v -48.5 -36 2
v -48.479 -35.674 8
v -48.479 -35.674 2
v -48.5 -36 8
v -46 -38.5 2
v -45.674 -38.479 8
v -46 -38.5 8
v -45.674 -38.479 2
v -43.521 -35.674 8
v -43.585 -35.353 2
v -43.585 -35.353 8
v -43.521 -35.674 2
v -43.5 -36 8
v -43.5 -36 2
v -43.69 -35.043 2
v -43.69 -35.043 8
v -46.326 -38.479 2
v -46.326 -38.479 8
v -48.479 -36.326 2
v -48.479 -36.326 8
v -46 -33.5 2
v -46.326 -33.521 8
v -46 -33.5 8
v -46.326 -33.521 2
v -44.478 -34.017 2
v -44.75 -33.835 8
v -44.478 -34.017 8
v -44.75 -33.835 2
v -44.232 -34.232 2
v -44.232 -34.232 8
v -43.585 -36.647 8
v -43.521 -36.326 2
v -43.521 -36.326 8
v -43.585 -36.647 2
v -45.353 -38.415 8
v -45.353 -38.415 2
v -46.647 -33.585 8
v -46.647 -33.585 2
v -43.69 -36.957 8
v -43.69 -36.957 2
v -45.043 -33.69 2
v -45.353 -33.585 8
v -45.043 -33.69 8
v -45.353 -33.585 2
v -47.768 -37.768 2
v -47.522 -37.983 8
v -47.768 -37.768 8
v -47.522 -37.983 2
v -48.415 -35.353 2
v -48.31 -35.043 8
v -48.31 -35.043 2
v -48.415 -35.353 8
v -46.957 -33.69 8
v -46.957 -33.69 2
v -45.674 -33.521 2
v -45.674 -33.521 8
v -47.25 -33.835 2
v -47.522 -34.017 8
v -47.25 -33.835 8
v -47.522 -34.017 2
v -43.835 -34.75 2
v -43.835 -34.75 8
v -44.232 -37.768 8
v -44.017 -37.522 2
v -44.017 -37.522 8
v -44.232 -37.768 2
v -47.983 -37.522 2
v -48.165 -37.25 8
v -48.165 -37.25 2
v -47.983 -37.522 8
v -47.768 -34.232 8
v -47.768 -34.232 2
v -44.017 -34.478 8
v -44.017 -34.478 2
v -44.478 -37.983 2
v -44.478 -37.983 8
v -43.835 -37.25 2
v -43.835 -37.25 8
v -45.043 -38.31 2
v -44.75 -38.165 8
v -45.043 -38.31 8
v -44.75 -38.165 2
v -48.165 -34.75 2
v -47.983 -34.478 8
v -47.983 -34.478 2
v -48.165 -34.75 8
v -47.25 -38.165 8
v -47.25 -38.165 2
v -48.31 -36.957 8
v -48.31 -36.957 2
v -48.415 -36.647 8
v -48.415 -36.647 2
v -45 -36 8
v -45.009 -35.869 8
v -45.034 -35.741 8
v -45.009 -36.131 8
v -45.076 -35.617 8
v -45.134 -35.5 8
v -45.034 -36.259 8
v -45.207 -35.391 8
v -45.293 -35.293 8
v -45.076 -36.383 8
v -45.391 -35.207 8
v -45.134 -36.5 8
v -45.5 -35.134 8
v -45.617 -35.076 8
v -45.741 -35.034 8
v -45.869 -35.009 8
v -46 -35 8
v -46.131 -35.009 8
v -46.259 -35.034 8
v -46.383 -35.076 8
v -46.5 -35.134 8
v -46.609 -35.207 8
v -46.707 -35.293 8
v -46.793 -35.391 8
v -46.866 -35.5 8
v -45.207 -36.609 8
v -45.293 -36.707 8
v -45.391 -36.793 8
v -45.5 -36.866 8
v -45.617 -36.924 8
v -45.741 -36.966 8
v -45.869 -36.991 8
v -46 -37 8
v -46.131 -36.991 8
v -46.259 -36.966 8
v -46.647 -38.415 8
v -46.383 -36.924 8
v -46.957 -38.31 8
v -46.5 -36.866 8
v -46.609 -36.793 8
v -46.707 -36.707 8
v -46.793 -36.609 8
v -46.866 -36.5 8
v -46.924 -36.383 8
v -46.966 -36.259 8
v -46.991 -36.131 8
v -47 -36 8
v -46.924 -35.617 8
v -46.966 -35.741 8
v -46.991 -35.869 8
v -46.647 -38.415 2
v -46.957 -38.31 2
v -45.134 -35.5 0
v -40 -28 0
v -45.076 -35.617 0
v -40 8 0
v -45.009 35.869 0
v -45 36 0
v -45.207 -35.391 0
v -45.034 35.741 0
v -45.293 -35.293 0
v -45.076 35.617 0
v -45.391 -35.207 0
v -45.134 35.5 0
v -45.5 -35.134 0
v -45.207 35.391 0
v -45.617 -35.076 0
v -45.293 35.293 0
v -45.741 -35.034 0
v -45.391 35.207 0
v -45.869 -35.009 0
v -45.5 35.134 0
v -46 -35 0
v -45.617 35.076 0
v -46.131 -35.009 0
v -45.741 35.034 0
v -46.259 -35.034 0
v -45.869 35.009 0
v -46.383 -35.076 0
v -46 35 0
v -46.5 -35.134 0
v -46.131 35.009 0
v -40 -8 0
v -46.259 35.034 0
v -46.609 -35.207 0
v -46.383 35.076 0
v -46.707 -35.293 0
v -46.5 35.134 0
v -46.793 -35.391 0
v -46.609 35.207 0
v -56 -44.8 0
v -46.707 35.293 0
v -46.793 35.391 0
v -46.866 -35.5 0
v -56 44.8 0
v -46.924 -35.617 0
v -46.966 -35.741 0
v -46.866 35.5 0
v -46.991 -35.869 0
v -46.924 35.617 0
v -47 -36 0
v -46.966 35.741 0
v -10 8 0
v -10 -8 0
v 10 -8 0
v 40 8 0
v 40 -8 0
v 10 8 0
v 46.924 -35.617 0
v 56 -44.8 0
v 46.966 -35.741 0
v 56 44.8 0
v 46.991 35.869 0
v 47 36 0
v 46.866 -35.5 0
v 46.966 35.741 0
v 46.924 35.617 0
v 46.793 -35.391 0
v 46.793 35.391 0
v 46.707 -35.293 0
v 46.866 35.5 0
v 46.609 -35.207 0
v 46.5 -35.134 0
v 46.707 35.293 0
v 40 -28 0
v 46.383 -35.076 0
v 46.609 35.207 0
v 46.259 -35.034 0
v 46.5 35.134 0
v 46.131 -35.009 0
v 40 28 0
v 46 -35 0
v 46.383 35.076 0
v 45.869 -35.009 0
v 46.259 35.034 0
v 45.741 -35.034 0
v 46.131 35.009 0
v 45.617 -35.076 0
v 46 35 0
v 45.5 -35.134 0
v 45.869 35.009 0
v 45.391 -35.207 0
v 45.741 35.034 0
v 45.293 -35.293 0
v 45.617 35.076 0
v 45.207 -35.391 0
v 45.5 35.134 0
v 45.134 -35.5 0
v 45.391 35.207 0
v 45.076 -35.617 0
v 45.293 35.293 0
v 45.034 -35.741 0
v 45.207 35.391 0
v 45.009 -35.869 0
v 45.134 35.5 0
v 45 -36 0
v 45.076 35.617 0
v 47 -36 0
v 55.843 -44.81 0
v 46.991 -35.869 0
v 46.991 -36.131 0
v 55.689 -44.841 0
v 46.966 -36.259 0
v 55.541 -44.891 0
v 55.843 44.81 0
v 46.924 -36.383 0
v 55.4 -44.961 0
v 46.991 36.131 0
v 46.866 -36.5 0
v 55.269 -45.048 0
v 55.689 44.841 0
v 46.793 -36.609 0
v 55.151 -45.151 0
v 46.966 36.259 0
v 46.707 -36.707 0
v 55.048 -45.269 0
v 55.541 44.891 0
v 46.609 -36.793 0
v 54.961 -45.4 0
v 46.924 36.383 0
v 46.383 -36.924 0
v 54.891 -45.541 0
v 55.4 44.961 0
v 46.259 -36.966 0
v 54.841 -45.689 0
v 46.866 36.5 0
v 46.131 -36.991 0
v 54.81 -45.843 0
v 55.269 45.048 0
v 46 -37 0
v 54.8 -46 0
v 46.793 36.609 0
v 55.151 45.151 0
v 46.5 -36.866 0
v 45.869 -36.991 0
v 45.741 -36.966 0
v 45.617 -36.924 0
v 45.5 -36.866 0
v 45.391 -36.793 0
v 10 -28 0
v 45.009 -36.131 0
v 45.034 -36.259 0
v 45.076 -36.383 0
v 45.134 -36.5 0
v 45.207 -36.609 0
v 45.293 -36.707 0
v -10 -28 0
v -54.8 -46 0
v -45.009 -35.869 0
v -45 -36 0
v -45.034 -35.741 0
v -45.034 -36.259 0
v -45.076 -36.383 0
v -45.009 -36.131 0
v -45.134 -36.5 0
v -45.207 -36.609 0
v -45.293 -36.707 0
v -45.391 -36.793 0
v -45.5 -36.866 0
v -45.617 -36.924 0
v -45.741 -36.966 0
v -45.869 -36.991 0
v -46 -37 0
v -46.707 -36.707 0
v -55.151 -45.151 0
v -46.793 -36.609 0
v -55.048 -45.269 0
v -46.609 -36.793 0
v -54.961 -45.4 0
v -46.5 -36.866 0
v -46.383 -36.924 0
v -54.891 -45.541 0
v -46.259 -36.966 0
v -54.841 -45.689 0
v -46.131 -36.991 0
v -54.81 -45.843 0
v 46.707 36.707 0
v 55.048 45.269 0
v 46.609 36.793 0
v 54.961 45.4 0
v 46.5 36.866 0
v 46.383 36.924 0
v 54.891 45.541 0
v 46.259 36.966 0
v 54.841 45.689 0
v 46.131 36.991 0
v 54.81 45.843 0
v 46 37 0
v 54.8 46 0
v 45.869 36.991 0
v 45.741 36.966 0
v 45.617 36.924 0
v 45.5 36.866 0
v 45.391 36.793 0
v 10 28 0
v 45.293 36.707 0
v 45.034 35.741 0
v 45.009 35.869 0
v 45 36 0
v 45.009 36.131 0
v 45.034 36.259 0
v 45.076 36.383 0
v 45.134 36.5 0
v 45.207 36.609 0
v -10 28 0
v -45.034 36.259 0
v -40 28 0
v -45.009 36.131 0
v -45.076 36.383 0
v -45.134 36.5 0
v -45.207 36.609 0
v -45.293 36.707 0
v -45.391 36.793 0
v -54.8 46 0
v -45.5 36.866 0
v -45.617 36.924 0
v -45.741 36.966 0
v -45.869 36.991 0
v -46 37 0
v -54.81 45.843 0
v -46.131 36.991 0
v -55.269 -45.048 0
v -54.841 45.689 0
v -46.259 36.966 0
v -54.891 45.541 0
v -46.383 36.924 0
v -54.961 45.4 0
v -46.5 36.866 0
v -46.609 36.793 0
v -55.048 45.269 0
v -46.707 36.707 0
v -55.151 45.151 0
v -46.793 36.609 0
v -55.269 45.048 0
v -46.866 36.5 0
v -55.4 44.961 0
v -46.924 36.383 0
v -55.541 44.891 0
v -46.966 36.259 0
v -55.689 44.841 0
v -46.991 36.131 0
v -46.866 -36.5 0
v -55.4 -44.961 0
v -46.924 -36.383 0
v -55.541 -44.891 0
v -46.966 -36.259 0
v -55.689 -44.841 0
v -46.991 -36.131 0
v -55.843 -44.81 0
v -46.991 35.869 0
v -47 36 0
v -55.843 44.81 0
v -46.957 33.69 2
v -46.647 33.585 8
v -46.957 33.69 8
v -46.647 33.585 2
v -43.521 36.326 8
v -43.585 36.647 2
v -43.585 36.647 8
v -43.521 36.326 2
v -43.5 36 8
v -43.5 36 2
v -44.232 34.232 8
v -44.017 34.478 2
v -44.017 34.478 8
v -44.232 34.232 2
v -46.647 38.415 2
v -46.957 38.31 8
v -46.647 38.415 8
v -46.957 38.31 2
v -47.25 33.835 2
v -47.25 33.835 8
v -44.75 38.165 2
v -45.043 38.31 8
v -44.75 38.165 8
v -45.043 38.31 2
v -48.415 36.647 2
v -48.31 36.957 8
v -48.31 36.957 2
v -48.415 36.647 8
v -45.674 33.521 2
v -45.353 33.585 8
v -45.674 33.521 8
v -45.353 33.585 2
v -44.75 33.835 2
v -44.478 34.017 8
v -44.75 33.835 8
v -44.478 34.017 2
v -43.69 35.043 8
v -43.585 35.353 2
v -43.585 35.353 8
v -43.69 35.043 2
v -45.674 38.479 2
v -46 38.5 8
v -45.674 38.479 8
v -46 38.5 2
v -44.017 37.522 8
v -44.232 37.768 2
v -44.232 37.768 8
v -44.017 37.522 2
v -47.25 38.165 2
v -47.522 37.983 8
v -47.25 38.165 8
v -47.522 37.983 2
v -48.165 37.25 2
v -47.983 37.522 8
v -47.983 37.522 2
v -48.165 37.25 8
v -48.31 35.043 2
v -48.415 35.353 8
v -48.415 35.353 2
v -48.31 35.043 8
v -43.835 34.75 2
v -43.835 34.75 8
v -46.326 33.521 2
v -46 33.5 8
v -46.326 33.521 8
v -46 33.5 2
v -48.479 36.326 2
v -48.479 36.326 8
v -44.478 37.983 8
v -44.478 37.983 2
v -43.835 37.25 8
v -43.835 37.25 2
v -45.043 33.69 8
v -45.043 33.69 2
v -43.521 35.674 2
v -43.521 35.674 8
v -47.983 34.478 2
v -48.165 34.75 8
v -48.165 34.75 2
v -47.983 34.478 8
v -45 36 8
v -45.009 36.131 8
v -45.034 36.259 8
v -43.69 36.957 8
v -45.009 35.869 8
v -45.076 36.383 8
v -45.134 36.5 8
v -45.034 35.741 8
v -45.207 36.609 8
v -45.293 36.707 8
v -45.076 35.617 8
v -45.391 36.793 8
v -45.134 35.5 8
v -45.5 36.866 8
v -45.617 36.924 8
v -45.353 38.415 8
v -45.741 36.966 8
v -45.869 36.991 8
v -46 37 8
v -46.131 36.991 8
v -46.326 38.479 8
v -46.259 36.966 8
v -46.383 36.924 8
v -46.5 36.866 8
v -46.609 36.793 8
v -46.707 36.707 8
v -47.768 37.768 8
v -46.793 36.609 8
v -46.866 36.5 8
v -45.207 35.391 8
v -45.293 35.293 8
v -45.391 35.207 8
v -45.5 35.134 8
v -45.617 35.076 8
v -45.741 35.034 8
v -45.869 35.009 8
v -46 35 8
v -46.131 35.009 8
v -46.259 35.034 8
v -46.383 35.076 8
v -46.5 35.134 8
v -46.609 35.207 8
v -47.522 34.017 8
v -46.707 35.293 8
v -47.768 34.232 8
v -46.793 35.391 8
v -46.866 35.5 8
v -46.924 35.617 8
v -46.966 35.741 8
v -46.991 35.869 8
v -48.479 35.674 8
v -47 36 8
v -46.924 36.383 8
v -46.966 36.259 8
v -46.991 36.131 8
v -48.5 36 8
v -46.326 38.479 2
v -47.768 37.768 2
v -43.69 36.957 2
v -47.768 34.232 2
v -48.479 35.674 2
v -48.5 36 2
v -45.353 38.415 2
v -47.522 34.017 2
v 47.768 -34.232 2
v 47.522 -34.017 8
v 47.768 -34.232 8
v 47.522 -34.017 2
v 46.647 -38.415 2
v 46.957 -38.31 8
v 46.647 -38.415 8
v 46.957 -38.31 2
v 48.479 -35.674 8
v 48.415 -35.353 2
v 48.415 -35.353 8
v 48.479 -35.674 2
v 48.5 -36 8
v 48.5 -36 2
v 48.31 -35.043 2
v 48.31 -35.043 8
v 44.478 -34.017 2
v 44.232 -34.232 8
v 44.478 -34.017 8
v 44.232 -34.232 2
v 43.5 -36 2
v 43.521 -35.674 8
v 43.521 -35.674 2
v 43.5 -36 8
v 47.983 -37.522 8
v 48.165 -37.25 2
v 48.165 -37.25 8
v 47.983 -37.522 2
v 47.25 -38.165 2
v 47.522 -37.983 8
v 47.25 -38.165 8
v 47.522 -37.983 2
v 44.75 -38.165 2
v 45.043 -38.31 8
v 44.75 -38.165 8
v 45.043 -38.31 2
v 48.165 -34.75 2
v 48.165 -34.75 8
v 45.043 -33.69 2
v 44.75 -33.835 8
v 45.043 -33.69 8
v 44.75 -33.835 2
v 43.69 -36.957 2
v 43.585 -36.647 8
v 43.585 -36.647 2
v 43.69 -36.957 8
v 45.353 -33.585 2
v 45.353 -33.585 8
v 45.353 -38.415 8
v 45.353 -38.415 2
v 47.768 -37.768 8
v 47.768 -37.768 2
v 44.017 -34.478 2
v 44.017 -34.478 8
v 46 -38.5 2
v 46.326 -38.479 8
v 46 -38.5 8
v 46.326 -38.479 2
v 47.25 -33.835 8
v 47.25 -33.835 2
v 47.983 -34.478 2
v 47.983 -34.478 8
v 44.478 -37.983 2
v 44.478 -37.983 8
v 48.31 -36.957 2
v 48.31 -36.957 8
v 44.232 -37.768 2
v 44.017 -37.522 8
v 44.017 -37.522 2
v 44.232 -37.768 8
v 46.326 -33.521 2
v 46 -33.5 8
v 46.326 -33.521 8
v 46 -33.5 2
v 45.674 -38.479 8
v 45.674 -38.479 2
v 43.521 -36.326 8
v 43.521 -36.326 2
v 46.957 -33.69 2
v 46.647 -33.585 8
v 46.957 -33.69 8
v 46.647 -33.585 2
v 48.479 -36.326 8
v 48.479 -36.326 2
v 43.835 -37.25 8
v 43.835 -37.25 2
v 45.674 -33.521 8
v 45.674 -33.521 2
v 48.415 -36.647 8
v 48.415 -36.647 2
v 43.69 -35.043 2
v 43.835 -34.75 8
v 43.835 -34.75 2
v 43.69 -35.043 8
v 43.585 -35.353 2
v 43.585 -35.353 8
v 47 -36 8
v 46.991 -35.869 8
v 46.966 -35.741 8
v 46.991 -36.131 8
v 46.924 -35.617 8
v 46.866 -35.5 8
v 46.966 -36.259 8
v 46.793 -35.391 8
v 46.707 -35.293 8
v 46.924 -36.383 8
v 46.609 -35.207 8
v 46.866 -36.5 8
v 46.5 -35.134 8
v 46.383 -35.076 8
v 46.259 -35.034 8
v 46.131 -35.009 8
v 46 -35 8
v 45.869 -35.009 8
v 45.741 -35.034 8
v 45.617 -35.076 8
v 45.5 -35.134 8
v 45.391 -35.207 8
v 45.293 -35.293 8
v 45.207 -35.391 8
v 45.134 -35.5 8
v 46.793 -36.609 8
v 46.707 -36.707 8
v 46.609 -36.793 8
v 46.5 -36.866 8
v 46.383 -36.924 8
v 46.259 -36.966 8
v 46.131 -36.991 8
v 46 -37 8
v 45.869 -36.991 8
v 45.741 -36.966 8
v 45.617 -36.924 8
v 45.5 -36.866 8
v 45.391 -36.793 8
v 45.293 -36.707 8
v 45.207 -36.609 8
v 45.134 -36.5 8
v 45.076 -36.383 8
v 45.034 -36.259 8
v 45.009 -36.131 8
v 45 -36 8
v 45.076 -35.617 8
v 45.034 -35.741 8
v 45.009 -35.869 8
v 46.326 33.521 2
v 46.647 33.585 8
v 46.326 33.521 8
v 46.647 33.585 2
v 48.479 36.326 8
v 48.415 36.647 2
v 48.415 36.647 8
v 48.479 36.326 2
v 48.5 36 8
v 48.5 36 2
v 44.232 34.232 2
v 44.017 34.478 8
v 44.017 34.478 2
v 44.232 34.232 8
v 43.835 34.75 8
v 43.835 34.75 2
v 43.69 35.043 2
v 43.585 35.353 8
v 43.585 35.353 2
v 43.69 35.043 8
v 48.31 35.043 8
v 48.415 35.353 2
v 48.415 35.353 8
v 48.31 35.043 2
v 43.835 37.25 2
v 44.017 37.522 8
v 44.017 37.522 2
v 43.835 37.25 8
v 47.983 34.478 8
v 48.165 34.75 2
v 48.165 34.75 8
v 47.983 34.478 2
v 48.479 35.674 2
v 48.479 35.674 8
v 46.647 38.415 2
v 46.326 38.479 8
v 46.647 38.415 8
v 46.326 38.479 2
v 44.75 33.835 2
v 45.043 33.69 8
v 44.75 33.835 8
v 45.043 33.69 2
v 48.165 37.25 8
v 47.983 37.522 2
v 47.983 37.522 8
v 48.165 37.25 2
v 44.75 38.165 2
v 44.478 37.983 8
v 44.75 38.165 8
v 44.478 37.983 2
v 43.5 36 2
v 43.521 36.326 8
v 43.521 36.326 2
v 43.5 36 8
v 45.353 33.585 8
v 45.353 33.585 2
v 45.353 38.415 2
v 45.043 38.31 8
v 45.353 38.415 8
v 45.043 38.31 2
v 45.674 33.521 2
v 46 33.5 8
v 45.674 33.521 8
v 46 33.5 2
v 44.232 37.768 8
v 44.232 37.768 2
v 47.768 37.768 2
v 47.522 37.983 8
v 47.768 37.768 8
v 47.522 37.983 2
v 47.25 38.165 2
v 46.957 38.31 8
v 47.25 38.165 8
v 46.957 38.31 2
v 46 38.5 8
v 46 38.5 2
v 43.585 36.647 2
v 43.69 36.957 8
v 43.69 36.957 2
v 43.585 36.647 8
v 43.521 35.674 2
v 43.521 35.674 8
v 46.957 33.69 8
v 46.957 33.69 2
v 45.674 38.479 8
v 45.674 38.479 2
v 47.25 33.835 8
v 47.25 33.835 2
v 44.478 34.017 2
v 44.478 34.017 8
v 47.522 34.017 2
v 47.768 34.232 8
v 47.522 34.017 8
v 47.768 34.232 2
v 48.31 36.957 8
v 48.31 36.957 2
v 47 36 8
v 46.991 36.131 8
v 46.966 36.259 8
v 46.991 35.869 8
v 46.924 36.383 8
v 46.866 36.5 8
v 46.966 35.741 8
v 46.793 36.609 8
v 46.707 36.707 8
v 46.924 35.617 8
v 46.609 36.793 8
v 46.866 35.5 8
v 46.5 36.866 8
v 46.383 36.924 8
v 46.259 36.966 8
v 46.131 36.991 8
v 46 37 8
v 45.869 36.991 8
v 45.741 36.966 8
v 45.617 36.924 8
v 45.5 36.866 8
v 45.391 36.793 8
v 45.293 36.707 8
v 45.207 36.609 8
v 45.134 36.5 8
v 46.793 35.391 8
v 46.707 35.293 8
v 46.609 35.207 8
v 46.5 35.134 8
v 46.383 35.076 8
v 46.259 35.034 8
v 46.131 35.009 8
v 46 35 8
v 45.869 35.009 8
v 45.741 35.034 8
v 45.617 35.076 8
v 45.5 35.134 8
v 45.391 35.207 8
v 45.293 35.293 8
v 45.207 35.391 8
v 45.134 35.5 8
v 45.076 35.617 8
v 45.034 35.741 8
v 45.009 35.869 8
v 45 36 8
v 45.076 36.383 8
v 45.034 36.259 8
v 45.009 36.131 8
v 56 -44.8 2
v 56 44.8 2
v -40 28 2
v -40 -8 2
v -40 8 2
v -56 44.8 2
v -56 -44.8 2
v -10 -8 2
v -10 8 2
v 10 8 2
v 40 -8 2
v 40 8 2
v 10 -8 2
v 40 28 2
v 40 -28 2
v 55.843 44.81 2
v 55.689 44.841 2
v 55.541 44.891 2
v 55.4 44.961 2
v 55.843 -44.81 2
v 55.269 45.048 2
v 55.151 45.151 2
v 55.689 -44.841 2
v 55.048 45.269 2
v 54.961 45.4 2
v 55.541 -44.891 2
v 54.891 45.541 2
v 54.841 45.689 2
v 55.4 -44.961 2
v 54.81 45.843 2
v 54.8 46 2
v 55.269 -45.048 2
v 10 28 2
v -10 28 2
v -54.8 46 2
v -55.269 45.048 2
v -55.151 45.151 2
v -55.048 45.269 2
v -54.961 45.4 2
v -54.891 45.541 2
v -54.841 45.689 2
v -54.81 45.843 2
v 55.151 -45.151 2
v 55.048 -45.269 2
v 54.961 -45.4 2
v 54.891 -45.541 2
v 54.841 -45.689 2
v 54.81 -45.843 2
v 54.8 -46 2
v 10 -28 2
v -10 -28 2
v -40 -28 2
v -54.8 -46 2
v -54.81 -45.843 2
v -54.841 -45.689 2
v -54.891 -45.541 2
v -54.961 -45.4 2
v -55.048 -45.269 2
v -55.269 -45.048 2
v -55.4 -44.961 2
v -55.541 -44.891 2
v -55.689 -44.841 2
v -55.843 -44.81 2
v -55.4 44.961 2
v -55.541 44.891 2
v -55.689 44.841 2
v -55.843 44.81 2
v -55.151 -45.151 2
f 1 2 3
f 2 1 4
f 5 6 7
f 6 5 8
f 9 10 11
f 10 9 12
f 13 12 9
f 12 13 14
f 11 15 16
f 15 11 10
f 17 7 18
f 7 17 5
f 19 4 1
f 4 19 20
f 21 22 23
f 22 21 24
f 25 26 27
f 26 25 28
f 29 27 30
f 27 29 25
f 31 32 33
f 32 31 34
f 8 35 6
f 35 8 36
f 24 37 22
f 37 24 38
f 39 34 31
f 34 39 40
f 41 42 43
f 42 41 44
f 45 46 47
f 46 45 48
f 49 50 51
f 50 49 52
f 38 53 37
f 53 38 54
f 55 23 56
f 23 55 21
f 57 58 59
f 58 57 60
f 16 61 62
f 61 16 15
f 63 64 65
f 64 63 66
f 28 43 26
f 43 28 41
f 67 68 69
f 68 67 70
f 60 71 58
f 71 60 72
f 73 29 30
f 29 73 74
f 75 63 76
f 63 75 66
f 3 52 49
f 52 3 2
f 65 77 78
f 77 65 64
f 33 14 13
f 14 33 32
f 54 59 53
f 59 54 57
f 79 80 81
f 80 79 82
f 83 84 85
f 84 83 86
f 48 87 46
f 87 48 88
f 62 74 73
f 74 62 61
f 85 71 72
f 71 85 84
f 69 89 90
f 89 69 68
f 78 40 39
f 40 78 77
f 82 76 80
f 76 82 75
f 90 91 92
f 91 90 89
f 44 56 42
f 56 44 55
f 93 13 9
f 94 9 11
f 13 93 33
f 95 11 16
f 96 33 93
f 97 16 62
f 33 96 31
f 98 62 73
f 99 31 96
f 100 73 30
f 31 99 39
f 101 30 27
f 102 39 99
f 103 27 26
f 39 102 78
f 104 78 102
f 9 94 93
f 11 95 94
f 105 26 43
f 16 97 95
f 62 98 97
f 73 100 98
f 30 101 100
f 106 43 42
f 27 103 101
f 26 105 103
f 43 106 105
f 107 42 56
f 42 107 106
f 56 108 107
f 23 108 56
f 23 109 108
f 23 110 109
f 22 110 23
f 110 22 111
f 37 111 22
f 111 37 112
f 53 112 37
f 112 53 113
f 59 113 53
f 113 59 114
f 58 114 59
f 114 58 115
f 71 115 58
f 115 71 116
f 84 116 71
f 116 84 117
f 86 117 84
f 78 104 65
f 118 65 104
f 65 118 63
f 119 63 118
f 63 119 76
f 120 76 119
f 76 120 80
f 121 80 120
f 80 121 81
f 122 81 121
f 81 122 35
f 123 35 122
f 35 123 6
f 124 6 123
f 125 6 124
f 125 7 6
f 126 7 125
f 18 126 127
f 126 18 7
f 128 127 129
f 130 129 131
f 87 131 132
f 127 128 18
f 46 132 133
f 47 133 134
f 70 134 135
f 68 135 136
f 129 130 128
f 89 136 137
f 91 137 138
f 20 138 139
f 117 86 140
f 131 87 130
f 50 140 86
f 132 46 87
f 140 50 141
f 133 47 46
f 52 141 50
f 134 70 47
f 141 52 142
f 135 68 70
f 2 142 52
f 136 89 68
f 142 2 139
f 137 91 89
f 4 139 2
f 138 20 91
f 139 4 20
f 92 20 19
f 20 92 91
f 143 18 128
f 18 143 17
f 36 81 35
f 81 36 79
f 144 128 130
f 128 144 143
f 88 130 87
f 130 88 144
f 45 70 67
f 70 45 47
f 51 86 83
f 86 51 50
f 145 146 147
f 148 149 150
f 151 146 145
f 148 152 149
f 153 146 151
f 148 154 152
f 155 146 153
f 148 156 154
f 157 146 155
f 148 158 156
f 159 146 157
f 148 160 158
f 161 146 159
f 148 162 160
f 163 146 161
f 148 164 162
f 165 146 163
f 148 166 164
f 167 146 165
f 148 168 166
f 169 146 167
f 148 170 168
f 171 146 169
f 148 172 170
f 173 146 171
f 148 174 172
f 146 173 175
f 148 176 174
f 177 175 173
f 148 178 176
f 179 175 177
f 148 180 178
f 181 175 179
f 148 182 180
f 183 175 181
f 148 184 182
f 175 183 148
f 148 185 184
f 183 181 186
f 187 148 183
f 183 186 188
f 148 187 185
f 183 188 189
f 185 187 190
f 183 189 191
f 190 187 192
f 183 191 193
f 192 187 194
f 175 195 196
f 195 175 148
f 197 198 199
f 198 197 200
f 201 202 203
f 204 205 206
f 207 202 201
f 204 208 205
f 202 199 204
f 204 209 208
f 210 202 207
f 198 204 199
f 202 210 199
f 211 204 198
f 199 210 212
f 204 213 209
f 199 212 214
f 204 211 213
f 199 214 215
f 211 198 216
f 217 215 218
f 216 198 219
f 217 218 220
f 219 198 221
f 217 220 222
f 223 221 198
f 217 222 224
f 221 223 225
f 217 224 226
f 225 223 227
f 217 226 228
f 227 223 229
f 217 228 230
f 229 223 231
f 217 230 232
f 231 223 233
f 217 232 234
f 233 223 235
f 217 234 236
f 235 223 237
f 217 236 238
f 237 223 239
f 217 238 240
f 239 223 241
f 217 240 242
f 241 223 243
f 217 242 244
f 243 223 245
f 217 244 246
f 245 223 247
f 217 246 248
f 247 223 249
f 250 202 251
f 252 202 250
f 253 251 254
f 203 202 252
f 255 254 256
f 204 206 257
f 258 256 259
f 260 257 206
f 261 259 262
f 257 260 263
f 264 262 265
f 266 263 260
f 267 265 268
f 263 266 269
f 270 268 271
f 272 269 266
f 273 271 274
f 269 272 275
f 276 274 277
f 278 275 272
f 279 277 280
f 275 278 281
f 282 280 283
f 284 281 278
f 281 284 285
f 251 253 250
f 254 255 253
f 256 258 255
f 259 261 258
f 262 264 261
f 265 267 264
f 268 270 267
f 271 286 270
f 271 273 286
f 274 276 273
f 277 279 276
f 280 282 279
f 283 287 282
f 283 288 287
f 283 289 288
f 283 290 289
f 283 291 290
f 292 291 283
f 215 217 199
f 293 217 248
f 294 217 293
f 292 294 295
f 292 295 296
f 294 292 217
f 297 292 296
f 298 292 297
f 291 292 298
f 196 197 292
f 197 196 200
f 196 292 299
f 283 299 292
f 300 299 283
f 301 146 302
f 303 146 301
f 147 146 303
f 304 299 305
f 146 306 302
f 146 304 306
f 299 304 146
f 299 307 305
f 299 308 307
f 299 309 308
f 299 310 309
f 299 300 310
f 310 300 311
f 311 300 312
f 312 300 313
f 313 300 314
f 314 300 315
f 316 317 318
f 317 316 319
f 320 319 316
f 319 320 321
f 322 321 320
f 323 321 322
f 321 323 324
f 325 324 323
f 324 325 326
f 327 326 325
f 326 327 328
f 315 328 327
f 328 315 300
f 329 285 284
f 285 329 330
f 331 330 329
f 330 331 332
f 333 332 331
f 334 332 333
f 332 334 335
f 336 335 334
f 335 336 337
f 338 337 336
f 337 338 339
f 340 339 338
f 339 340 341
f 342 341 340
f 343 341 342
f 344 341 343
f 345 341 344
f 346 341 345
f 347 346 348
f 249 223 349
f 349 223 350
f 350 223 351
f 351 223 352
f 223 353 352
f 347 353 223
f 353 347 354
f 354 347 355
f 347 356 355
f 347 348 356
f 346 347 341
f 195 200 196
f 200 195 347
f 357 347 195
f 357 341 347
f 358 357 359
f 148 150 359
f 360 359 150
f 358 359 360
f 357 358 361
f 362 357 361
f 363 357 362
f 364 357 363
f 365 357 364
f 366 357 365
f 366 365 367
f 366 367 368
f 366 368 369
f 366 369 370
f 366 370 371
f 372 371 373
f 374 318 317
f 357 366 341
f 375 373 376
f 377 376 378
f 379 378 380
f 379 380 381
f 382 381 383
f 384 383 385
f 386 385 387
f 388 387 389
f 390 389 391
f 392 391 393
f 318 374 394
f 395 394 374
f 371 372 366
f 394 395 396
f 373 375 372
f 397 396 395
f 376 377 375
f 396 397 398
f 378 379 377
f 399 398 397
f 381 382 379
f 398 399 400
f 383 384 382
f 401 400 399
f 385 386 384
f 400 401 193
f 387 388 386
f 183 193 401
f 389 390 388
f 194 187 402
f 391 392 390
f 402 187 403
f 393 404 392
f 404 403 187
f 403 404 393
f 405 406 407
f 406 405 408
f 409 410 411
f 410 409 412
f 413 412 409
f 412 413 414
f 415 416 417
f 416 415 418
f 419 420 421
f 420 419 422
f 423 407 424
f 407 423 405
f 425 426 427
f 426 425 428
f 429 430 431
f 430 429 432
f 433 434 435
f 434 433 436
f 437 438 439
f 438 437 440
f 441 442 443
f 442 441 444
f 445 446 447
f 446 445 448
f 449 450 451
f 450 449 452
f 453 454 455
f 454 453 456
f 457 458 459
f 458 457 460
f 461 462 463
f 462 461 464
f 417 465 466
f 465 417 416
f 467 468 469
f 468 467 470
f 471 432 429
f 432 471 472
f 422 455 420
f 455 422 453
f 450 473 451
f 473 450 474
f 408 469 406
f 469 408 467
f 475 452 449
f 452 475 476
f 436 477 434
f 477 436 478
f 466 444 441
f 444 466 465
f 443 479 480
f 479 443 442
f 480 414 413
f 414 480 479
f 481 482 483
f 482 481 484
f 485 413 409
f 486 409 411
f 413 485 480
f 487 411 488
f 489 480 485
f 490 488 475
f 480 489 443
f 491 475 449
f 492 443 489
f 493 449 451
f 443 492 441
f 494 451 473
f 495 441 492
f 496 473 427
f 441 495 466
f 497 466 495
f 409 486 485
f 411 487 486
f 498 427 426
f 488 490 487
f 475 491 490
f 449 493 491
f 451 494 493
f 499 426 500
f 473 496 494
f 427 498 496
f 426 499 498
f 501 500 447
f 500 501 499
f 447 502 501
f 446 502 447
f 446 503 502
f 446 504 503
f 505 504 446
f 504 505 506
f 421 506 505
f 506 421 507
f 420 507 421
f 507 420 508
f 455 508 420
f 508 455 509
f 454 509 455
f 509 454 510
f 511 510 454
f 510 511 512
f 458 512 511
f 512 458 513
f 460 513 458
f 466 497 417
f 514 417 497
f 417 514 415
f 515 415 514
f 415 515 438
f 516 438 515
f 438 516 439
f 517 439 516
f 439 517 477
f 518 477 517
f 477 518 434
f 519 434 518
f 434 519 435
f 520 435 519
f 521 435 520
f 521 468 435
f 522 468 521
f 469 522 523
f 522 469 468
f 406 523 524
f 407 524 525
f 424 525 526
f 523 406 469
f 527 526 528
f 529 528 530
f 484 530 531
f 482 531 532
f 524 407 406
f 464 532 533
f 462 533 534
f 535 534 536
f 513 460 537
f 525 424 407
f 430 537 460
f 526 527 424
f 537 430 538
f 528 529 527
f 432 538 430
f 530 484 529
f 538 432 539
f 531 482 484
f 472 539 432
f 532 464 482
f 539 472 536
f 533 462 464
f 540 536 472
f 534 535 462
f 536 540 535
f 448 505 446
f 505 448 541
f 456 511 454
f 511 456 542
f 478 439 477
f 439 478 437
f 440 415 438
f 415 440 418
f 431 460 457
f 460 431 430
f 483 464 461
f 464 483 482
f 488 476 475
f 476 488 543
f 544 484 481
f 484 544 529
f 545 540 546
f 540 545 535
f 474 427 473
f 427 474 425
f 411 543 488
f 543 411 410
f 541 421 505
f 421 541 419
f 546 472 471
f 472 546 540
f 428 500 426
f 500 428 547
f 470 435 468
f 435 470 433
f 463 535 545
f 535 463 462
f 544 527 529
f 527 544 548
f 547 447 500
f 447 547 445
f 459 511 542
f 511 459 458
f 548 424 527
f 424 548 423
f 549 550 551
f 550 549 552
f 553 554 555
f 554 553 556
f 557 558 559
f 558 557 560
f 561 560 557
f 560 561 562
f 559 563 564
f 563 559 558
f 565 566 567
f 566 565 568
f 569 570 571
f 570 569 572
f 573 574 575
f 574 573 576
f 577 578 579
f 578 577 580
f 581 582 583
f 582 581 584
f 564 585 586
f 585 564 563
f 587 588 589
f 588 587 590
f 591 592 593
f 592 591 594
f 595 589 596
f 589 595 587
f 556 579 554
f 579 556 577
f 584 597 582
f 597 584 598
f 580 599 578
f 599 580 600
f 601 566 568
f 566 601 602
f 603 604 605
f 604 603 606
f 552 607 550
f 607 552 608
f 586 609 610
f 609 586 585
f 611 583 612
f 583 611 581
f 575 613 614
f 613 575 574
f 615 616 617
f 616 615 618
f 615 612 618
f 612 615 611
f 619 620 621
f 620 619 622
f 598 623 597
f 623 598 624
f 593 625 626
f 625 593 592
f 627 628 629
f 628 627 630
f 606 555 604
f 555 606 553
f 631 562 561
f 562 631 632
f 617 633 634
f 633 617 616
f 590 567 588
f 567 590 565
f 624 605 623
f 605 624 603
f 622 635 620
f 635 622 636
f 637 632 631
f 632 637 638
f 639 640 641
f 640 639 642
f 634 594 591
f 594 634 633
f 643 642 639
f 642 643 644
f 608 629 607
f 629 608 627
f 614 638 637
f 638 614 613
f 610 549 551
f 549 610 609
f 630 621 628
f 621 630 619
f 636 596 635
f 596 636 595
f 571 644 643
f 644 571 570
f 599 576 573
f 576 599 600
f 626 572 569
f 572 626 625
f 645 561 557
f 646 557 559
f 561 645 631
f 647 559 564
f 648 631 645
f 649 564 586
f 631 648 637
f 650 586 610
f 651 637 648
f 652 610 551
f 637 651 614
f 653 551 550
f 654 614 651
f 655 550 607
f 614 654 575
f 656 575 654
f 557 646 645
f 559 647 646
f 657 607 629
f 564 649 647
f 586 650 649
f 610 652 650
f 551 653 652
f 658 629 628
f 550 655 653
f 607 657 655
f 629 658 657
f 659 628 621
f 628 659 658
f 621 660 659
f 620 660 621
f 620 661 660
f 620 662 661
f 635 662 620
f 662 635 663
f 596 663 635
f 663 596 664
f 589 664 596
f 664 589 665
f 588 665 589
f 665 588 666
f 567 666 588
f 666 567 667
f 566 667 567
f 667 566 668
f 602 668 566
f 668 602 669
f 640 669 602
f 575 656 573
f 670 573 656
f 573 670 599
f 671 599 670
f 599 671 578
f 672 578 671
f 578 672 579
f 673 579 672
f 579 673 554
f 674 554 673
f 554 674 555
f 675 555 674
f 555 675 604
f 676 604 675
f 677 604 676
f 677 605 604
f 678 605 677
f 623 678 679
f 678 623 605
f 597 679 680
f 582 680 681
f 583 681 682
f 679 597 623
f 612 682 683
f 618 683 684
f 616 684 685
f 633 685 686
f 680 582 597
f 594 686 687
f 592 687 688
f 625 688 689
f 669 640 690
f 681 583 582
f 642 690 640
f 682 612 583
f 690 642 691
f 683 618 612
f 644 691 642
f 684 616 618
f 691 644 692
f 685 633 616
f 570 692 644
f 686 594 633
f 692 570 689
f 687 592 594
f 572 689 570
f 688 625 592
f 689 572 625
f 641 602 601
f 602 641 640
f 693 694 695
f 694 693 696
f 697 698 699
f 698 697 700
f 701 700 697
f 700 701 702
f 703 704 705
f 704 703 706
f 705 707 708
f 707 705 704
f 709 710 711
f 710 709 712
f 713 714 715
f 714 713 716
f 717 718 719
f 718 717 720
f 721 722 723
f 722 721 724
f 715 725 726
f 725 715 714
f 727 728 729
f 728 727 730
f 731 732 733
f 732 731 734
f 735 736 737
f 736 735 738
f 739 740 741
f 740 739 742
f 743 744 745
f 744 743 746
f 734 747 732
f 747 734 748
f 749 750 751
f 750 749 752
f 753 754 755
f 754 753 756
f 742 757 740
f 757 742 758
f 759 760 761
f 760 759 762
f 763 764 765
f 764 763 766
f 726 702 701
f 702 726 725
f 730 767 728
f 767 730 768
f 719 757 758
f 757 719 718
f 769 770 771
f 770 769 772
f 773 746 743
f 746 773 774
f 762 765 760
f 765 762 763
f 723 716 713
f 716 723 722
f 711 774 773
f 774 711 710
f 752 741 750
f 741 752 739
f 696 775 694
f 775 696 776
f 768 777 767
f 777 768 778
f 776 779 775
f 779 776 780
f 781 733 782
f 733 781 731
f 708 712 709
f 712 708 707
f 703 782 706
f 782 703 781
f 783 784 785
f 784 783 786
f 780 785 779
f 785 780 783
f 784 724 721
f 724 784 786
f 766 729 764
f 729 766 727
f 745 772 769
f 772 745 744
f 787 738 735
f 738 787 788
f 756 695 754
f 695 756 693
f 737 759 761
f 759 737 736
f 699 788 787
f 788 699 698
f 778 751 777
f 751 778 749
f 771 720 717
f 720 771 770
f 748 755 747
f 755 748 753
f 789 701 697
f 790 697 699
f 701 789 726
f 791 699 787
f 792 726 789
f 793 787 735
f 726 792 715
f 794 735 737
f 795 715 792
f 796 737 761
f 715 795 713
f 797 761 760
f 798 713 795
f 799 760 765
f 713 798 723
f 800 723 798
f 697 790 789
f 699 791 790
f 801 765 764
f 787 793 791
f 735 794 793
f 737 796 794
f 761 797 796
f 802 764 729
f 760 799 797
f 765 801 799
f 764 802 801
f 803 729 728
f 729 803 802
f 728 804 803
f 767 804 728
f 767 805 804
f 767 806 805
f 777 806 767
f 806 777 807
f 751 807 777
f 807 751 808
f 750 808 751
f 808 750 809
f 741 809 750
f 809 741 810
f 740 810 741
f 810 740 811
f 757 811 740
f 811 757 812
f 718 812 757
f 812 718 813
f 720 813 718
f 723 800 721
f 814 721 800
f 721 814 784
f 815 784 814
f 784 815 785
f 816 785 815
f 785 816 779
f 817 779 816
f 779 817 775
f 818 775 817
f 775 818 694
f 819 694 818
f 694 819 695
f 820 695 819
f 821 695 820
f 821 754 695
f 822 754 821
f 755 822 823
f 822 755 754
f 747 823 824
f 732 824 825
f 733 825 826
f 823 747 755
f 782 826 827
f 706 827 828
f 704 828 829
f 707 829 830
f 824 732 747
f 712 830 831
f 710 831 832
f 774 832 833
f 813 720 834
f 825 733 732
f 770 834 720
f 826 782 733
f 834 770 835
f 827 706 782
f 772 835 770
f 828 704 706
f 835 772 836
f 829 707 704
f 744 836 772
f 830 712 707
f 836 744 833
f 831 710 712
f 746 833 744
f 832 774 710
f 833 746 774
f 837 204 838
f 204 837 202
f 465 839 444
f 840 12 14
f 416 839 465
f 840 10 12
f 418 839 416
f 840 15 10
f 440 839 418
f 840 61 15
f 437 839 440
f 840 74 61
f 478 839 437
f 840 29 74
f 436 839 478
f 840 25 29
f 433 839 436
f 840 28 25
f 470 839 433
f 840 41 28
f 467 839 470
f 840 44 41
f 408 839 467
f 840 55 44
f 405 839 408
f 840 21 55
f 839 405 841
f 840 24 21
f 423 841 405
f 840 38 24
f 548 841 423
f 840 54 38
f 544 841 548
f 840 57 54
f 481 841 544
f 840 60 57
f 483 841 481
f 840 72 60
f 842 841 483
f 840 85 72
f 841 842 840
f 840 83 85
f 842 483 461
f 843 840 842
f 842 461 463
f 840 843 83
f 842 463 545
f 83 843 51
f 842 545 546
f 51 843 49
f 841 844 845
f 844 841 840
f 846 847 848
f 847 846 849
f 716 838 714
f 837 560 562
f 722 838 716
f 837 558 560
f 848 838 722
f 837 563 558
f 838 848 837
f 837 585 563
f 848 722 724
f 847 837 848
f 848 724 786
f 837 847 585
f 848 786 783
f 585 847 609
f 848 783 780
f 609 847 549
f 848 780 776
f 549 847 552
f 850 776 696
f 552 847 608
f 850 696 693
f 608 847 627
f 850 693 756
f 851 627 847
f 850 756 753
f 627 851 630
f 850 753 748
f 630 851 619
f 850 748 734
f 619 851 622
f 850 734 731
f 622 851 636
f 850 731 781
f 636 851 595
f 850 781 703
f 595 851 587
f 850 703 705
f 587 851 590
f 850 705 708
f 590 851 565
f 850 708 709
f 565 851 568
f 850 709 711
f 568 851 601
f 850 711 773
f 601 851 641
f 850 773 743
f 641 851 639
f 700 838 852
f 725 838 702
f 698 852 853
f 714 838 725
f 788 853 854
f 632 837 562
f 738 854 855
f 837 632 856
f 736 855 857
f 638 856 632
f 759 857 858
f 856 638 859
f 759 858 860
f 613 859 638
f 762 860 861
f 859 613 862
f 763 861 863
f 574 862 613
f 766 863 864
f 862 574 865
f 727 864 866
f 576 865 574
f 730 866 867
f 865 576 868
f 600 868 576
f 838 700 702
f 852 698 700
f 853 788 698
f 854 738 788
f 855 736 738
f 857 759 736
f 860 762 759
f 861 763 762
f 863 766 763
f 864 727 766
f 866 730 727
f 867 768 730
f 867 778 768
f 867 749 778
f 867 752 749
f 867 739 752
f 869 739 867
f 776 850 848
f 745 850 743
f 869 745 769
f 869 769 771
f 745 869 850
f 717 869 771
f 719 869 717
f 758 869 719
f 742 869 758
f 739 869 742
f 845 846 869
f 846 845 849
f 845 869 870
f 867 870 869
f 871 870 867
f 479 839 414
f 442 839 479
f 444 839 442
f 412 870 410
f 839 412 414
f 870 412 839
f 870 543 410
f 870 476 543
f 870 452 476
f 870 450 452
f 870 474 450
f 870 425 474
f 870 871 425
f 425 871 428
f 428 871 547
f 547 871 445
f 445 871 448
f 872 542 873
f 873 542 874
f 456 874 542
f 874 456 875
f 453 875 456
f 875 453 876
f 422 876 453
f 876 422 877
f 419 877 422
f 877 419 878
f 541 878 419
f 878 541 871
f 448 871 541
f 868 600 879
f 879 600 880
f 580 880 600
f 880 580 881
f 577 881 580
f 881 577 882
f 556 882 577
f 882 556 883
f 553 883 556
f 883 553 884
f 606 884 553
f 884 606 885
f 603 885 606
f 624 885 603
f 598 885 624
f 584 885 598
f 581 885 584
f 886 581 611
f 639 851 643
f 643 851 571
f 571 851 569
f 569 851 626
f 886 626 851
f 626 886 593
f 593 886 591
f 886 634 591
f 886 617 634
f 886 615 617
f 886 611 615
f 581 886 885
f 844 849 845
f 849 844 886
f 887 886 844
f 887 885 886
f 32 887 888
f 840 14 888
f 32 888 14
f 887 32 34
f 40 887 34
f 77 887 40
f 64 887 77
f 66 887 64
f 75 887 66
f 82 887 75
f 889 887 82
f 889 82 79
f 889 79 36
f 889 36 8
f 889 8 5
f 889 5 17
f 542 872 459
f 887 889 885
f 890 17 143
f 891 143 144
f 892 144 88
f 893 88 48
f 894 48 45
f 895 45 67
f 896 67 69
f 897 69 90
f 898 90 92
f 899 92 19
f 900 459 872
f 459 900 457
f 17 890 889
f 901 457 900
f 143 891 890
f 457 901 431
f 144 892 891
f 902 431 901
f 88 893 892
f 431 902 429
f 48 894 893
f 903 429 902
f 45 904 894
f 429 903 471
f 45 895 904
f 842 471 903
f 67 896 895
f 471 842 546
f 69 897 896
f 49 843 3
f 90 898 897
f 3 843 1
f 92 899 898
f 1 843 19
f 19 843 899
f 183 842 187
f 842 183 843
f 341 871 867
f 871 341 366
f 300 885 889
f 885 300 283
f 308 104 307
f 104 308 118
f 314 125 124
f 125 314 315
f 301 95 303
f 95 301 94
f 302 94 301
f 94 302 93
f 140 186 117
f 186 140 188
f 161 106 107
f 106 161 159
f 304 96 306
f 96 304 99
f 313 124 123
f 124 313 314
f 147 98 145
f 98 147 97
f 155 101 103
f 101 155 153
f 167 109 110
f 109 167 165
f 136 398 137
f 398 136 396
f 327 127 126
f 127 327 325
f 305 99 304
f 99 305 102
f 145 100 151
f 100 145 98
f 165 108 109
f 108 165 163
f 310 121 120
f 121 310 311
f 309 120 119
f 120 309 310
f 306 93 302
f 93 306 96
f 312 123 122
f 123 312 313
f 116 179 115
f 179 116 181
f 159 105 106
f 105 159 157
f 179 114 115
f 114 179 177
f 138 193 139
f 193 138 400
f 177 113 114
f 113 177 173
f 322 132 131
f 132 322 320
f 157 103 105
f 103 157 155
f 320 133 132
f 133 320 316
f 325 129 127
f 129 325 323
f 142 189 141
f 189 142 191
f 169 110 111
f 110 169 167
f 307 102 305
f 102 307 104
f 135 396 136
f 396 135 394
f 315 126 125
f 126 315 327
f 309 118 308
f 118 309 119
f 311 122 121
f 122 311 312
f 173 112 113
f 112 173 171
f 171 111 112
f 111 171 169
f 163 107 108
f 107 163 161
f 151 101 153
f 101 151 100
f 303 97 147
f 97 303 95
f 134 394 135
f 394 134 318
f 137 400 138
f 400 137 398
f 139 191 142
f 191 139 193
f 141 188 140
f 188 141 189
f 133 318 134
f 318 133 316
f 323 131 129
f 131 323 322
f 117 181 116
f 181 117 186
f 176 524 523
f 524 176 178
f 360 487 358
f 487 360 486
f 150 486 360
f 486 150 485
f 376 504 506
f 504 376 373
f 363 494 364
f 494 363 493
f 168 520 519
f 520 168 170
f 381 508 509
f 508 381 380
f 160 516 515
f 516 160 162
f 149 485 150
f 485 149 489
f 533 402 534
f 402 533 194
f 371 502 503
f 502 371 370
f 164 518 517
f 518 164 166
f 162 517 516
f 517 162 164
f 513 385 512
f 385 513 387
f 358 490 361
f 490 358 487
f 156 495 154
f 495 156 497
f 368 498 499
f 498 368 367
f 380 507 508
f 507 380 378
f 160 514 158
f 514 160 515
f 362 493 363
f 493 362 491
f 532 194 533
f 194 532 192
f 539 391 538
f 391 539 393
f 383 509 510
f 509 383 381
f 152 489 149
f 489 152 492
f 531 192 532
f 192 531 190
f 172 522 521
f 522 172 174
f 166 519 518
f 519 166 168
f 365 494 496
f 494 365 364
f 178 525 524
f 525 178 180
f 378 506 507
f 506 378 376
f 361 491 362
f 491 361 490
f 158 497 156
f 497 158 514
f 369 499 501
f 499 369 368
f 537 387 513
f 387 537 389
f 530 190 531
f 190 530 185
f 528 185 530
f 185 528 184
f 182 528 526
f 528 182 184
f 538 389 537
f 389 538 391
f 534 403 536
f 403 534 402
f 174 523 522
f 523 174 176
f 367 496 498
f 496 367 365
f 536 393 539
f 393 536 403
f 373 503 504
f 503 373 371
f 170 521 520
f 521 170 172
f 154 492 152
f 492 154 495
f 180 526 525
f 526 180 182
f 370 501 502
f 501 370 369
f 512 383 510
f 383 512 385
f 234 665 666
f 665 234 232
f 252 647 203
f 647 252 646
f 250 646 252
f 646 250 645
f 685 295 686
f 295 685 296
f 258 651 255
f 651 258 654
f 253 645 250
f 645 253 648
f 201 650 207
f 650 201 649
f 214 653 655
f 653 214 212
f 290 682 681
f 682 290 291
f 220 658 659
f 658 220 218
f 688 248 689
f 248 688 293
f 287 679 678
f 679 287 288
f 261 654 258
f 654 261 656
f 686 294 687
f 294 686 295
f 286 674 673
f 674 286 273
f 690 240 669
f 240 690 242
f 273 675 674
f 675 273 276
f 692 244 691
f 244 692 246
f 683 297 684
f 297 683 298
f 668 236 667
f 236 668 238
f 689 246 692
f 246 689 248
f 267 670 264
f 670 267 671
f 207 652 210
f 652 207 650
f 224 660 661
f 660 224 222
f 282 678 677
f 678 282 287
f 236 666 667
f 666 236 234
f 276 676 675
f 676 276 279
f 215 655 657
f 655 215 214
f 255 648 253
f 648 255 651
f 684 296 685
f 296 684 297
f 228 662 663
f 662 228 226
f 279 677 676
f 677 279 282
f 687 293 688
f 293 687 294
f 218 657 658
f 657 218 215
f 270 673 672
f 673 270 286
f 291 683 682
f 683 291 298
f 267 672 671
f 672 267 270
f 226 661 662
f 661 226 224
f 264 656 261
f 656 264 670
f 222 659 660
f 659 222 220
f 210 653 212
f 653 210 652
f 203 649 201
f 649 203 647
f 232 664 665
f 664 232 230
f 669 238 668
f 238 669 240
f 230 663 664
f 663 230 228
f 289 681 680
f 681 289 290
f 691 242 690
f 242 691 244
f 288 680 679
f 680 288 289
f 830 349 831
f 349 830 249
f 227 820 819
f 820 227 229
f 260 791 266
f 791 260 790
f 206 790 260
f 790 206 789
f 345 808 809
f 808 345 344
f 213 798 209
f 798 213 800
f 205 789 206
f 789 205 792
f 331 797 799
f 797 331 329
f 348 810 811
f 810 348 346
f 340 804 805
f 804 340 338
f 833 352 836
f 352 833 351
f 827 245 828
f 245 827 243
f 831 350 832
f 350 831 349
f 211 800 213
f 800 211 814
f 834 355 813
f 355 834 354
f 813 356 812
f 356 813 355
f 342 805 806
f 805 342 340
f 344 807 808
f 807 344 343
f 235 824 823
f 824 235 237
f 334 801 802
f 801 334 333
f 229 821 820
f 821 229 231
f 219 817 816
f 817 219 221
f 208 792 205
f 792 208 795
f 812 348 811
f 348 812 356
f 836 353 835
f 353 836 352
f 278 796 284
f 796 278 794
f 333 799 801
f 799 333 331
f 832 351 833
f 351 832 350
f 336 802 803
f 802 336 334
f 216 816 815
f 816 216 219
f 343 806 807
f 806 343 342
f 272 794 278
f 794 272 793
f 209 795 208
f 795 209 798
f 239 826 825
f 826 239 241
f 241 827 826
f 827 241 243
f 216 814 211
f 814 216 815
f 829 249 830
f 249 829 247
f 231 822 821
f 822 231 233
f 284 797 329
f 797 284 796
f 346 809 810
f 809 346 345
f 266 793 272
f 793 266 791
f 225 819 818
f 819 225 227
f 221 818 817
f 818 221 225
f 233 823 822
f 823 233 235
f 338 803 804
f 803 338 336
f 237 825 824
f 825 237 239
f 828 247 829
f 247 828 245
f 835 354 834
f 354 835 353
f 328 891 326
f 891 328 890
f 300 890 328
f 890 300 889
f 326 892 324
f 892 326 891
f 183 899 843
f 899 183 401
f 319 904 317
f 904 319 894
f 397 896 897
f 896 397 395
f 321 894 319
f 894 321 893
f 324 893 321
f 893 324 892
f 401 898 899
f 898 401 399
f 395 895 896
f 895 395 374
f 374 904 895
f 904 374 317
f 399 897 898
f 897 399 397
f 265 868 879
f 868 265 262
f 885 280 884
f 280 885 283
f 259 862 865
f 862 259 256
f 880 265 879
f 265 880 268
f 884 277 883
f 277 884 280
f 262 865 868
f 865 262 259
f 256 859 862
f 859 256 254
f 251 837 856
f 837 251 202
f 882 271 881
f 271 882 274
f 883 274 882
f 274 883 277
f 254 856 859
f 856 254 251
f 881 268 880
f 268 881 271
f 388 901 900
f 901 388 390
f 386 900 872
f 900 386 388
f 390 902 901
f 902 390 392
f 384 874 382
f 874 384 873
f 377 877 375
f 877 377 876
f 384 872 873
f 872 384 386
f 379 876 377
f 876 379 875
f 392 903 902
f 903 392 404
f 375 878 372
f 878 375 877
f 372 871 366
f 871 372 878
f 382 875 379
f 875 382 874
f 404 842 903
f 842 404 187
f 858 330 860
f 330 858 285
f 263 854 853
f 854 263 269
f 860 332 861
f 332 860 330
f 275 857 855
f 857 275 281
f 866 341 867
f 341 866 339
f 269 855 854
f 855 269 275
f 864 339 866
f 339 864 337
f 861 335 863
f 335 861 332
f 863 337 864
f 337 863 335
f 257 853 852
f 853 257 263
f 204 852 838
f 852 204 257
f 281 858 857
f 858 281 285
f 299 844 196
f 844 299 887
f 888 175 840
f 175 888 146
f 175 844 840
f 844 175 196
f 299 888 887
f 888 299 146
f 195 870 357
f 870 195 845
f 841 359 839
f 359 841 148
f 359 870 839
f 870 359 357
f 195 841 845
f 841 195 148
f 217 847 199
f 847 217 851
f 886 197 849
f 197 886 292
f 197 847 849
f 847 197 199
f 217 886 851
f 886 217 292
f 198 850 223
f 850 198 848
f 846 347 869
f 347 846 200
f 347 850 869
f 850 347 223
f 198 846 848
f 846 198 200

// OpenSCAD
// file: params.scad
/*
 * params.scad — every dimension the printed parts share, in millimetres.
 * ======================================================================
 * Included by all cad/*.scad files. No dimension may be duplicated in a part
 * file; if two parts need the same number, it lives here.
 *
 * Values marked MEASURE are design targets until caliper measurements of a real
 * X240 top section replace them (issue #44). Everything else is a design choice.
 */

// ---------------------------------------------------------------- deck / case
case_width  = 309.0;   // MEASURE  X, left to right, at the deck's mating surface
case_depth  = 210.0;   // MEASURE  Y, front (palmrest) to back
wall_t      = 2.5;     // PETG shell wall
corner_r    = 3.0;     // MEASURE  outer corner radius
internal_h  = 18.0;    // floor-to-deck clearance (see docs/enclosure/integration.md)
case_h      = internal_h + wall_t;

// Screw bosses that meet the X240 deck, from the front-left corner.  MEASURE all.
deck_boss_positions = [
    [  8.0,   8.0 ], [ 60.0,   8.0 ], [150.0,   8.0 ], [250.0,   8.0 ], [301.0,   8.0 ],
    [  8.0, 202.0 ], [150.0, 202.0 ], [301.0, 202.0 ],
];
boss_od = 6.0;
boss_id = 3.2;         // M2 heat-set insert hole (insert OD ~3.2 for a 3.5 mm body)

// ---------------------------------------------------------------- split joint
split      = true;     // print as two halves (fits a 220 mm bed); false = one piece
split_x    = case_width / 2;
tab_count  = 3;        // dovetail tabs along the floor seam
tab_w      = 14.0;     // tab width at the seam
tab_flare  = 3.0;      // extra width at the tip (dovetail angle)
tab_len    = 10.0;     // how far the tab reaches into the other half
joint_gap  = 0.15;     // clearance per face; tune with a 30 mm coupon
pin_d      = 3.0;      // alignment pins through the front/rear walls
pin_len    = 10.0;

// ---------------------------------------------------------------- board / sled
board_w    = 100.0;    // stripboard or Rev B PCB
board_d    = 80.0;
board_hole_inset = 4.0;                  // M2 holes this far from each board corner
board_hole_d     = 2.4;
sled_margin      = 6.0;                  // sled extends this far past the board
sled_t           = 2.0;
sled_standoff_h  = 6.0;                  // board sits this high above the sled
sled_standoff_od = 5.0;
// sled centre in the case (rear-centre; see docs/enclosure/integration.md)
sled_center = [ case_width / 2, case_depth - 8 - board_d / 2 - sled_margin - 6 ];
// sled-to-case bosses (around the sled, two per half so the sled bridges the seam)
sled_boss_offsets = [ [-56, -46], [56, -46], [-56, 46], [56, 46] ];

// ---------------------------------------------------------------- Pico
pico_w = 51.0;
pico_d = 21.0;
pico_h = 1.0;          // PCB thickness
pico_hole_d = 2.1;     // Pico mounting holes, 11.4 x 47 mm pattern
pico_hole_dx = 47.0;
pico_hole_dy = 11.4;

// ---------------------------------------------------------------- USB
usb_c     = false;                     // false = Micro-USB cutout, true = USB-C
usb_w     = usb_c ? 9.5 : 8.5;
usb_h     = usb_c ? 4.0 : 3.5;
usb_x     = sled_center[0];            // cutout centred on the board
usb_z     = wall_t + sled_t + sled_standoff_h + 1.6;   // bottom of the Pico's connector
cable_d   = 4.5;                       // USB cable jacket diameter
relief_w  = 22.0;                      // strain-relief bezel footprint
relief_d  = 12.0;
relief_h  = 10.0;

// ---------------------------------------------------------------- FPC
fpc_w        = 22.0;   // 40-pin 0.5 mm cable width
fpc_t        = 0.3;
fpc_min_r    = 5.0;    // minimum bend radius
clickpad_fpc_w = 8.0;  // MEASURE  ClickPad cable width
zif_body_w   = 26.0;   // 40-pin ZIF connector body length along the cable edge
zif_body_d   = 6.0;
zif_body_h   = 5.0;
zif_cp_body_w = 12.0;  // ClickPad ZIF body (pin count from probing)

// ---------------------------------------------------------------- gasket, vents, feet
gasket_depth = 1.2;
gasket_width = 2.0;
vents        = false;  // not thermally needed (docs/enclosure/durability.md)
vent_w = 40.0; vent_h = 2.0; vent_count = 4; vent_spacing = 6.0;
ribs         = true;   // two front-to-back stiffening ribs in the floor
rib_t        = 2.0;
rib_h        = 4.0;

foot_d       = 10.0;   // rubber feet, front
foot_recess  = 1.0;
foot_positions = [ [25, 20], [case_width - 25, 20] ];
tilt_positions = [ [25, case_depth - 20], [case_width - 25, case_depth - 20] ];
tilt_h       = 12.0;   // rear riser height
tilt_w       = 30.0;
tilt_d       = 20.0;
tilt_screw_d = 3.4;    // M3 clearance

// ---------------------------------------------------------------- LED light pipe
pipe_d       = 3.0;
pipe_flange_d= 5.0;
pipe_len     = internal_h - 2;
pipe_position = [ sled_center[0] + board_w / 2 + 15, sled_center[1] - 20 ];  // beside the touchpad

// ---------------------------------------------------------------- printing
fit      = 0.2;        // general hole clearance for printed-in-place fits
$fn      = 48;
// main file
/*
 * perfboard_sled.scad — tray that carries the Rev A stripboard or the Rev B PCB
 * ===========================================================================
 * Screws to the four sled bosses in the bottom case (two per half, so it bridges
 * the split seam and stiffens the joined shell).  The board sits on four M2
 * standoffs on the board's own hole pattern.  Both the stripboard and the Rev B
 * PCB are drilled to this pattern (docs/hardware/pcb.md).
 */
include <params.scad>

sled_w = board_w + 2 * sled_margin;
sled_d = board_d + 2 * sled_margin;

module sled() {
    difference() {
        union() {
            // plate
            translate([-sled_w / 2, -sled_d / 2, 0]) cube([sled_w, sled_d, sled_t]);
            // board standoffs
            for (x = [-1, 1], y = [-1, 1])
                translate([x * (board_w / 2 - board_hole_inset), y * (board_d / 2 - board_hole_inset), 0])
                    cylinder(h = sled_t + sled_standoff_h, d = sled_standoff_od);
        }
        // board M2 holes through the standoffs
        for (x = [-1, 1], y = [-1, 1])
            translate([x * (board_w / 2 - board_hole_inset), y * (board_d / 2 - board_hole_inset), -1])
                cylinder(h = sled_t + sled_standoff_h + 2, d = board_hole_d - 0.4);   // tap M2 directly into PETG
        // case boss holes
        for (o = sled_boss_offsets) translate([o[0], o[1], -1]) cylinder(h = sled_t + 2, d = board_hole_d);
        // lightening windows
        for (x = [-1, 1], y = [-1, 1])
            translate([x * 25 - 15, y * 18 - 10, -1]) cube([30, 20, sled_t + 2]);
    }
}

sled();
